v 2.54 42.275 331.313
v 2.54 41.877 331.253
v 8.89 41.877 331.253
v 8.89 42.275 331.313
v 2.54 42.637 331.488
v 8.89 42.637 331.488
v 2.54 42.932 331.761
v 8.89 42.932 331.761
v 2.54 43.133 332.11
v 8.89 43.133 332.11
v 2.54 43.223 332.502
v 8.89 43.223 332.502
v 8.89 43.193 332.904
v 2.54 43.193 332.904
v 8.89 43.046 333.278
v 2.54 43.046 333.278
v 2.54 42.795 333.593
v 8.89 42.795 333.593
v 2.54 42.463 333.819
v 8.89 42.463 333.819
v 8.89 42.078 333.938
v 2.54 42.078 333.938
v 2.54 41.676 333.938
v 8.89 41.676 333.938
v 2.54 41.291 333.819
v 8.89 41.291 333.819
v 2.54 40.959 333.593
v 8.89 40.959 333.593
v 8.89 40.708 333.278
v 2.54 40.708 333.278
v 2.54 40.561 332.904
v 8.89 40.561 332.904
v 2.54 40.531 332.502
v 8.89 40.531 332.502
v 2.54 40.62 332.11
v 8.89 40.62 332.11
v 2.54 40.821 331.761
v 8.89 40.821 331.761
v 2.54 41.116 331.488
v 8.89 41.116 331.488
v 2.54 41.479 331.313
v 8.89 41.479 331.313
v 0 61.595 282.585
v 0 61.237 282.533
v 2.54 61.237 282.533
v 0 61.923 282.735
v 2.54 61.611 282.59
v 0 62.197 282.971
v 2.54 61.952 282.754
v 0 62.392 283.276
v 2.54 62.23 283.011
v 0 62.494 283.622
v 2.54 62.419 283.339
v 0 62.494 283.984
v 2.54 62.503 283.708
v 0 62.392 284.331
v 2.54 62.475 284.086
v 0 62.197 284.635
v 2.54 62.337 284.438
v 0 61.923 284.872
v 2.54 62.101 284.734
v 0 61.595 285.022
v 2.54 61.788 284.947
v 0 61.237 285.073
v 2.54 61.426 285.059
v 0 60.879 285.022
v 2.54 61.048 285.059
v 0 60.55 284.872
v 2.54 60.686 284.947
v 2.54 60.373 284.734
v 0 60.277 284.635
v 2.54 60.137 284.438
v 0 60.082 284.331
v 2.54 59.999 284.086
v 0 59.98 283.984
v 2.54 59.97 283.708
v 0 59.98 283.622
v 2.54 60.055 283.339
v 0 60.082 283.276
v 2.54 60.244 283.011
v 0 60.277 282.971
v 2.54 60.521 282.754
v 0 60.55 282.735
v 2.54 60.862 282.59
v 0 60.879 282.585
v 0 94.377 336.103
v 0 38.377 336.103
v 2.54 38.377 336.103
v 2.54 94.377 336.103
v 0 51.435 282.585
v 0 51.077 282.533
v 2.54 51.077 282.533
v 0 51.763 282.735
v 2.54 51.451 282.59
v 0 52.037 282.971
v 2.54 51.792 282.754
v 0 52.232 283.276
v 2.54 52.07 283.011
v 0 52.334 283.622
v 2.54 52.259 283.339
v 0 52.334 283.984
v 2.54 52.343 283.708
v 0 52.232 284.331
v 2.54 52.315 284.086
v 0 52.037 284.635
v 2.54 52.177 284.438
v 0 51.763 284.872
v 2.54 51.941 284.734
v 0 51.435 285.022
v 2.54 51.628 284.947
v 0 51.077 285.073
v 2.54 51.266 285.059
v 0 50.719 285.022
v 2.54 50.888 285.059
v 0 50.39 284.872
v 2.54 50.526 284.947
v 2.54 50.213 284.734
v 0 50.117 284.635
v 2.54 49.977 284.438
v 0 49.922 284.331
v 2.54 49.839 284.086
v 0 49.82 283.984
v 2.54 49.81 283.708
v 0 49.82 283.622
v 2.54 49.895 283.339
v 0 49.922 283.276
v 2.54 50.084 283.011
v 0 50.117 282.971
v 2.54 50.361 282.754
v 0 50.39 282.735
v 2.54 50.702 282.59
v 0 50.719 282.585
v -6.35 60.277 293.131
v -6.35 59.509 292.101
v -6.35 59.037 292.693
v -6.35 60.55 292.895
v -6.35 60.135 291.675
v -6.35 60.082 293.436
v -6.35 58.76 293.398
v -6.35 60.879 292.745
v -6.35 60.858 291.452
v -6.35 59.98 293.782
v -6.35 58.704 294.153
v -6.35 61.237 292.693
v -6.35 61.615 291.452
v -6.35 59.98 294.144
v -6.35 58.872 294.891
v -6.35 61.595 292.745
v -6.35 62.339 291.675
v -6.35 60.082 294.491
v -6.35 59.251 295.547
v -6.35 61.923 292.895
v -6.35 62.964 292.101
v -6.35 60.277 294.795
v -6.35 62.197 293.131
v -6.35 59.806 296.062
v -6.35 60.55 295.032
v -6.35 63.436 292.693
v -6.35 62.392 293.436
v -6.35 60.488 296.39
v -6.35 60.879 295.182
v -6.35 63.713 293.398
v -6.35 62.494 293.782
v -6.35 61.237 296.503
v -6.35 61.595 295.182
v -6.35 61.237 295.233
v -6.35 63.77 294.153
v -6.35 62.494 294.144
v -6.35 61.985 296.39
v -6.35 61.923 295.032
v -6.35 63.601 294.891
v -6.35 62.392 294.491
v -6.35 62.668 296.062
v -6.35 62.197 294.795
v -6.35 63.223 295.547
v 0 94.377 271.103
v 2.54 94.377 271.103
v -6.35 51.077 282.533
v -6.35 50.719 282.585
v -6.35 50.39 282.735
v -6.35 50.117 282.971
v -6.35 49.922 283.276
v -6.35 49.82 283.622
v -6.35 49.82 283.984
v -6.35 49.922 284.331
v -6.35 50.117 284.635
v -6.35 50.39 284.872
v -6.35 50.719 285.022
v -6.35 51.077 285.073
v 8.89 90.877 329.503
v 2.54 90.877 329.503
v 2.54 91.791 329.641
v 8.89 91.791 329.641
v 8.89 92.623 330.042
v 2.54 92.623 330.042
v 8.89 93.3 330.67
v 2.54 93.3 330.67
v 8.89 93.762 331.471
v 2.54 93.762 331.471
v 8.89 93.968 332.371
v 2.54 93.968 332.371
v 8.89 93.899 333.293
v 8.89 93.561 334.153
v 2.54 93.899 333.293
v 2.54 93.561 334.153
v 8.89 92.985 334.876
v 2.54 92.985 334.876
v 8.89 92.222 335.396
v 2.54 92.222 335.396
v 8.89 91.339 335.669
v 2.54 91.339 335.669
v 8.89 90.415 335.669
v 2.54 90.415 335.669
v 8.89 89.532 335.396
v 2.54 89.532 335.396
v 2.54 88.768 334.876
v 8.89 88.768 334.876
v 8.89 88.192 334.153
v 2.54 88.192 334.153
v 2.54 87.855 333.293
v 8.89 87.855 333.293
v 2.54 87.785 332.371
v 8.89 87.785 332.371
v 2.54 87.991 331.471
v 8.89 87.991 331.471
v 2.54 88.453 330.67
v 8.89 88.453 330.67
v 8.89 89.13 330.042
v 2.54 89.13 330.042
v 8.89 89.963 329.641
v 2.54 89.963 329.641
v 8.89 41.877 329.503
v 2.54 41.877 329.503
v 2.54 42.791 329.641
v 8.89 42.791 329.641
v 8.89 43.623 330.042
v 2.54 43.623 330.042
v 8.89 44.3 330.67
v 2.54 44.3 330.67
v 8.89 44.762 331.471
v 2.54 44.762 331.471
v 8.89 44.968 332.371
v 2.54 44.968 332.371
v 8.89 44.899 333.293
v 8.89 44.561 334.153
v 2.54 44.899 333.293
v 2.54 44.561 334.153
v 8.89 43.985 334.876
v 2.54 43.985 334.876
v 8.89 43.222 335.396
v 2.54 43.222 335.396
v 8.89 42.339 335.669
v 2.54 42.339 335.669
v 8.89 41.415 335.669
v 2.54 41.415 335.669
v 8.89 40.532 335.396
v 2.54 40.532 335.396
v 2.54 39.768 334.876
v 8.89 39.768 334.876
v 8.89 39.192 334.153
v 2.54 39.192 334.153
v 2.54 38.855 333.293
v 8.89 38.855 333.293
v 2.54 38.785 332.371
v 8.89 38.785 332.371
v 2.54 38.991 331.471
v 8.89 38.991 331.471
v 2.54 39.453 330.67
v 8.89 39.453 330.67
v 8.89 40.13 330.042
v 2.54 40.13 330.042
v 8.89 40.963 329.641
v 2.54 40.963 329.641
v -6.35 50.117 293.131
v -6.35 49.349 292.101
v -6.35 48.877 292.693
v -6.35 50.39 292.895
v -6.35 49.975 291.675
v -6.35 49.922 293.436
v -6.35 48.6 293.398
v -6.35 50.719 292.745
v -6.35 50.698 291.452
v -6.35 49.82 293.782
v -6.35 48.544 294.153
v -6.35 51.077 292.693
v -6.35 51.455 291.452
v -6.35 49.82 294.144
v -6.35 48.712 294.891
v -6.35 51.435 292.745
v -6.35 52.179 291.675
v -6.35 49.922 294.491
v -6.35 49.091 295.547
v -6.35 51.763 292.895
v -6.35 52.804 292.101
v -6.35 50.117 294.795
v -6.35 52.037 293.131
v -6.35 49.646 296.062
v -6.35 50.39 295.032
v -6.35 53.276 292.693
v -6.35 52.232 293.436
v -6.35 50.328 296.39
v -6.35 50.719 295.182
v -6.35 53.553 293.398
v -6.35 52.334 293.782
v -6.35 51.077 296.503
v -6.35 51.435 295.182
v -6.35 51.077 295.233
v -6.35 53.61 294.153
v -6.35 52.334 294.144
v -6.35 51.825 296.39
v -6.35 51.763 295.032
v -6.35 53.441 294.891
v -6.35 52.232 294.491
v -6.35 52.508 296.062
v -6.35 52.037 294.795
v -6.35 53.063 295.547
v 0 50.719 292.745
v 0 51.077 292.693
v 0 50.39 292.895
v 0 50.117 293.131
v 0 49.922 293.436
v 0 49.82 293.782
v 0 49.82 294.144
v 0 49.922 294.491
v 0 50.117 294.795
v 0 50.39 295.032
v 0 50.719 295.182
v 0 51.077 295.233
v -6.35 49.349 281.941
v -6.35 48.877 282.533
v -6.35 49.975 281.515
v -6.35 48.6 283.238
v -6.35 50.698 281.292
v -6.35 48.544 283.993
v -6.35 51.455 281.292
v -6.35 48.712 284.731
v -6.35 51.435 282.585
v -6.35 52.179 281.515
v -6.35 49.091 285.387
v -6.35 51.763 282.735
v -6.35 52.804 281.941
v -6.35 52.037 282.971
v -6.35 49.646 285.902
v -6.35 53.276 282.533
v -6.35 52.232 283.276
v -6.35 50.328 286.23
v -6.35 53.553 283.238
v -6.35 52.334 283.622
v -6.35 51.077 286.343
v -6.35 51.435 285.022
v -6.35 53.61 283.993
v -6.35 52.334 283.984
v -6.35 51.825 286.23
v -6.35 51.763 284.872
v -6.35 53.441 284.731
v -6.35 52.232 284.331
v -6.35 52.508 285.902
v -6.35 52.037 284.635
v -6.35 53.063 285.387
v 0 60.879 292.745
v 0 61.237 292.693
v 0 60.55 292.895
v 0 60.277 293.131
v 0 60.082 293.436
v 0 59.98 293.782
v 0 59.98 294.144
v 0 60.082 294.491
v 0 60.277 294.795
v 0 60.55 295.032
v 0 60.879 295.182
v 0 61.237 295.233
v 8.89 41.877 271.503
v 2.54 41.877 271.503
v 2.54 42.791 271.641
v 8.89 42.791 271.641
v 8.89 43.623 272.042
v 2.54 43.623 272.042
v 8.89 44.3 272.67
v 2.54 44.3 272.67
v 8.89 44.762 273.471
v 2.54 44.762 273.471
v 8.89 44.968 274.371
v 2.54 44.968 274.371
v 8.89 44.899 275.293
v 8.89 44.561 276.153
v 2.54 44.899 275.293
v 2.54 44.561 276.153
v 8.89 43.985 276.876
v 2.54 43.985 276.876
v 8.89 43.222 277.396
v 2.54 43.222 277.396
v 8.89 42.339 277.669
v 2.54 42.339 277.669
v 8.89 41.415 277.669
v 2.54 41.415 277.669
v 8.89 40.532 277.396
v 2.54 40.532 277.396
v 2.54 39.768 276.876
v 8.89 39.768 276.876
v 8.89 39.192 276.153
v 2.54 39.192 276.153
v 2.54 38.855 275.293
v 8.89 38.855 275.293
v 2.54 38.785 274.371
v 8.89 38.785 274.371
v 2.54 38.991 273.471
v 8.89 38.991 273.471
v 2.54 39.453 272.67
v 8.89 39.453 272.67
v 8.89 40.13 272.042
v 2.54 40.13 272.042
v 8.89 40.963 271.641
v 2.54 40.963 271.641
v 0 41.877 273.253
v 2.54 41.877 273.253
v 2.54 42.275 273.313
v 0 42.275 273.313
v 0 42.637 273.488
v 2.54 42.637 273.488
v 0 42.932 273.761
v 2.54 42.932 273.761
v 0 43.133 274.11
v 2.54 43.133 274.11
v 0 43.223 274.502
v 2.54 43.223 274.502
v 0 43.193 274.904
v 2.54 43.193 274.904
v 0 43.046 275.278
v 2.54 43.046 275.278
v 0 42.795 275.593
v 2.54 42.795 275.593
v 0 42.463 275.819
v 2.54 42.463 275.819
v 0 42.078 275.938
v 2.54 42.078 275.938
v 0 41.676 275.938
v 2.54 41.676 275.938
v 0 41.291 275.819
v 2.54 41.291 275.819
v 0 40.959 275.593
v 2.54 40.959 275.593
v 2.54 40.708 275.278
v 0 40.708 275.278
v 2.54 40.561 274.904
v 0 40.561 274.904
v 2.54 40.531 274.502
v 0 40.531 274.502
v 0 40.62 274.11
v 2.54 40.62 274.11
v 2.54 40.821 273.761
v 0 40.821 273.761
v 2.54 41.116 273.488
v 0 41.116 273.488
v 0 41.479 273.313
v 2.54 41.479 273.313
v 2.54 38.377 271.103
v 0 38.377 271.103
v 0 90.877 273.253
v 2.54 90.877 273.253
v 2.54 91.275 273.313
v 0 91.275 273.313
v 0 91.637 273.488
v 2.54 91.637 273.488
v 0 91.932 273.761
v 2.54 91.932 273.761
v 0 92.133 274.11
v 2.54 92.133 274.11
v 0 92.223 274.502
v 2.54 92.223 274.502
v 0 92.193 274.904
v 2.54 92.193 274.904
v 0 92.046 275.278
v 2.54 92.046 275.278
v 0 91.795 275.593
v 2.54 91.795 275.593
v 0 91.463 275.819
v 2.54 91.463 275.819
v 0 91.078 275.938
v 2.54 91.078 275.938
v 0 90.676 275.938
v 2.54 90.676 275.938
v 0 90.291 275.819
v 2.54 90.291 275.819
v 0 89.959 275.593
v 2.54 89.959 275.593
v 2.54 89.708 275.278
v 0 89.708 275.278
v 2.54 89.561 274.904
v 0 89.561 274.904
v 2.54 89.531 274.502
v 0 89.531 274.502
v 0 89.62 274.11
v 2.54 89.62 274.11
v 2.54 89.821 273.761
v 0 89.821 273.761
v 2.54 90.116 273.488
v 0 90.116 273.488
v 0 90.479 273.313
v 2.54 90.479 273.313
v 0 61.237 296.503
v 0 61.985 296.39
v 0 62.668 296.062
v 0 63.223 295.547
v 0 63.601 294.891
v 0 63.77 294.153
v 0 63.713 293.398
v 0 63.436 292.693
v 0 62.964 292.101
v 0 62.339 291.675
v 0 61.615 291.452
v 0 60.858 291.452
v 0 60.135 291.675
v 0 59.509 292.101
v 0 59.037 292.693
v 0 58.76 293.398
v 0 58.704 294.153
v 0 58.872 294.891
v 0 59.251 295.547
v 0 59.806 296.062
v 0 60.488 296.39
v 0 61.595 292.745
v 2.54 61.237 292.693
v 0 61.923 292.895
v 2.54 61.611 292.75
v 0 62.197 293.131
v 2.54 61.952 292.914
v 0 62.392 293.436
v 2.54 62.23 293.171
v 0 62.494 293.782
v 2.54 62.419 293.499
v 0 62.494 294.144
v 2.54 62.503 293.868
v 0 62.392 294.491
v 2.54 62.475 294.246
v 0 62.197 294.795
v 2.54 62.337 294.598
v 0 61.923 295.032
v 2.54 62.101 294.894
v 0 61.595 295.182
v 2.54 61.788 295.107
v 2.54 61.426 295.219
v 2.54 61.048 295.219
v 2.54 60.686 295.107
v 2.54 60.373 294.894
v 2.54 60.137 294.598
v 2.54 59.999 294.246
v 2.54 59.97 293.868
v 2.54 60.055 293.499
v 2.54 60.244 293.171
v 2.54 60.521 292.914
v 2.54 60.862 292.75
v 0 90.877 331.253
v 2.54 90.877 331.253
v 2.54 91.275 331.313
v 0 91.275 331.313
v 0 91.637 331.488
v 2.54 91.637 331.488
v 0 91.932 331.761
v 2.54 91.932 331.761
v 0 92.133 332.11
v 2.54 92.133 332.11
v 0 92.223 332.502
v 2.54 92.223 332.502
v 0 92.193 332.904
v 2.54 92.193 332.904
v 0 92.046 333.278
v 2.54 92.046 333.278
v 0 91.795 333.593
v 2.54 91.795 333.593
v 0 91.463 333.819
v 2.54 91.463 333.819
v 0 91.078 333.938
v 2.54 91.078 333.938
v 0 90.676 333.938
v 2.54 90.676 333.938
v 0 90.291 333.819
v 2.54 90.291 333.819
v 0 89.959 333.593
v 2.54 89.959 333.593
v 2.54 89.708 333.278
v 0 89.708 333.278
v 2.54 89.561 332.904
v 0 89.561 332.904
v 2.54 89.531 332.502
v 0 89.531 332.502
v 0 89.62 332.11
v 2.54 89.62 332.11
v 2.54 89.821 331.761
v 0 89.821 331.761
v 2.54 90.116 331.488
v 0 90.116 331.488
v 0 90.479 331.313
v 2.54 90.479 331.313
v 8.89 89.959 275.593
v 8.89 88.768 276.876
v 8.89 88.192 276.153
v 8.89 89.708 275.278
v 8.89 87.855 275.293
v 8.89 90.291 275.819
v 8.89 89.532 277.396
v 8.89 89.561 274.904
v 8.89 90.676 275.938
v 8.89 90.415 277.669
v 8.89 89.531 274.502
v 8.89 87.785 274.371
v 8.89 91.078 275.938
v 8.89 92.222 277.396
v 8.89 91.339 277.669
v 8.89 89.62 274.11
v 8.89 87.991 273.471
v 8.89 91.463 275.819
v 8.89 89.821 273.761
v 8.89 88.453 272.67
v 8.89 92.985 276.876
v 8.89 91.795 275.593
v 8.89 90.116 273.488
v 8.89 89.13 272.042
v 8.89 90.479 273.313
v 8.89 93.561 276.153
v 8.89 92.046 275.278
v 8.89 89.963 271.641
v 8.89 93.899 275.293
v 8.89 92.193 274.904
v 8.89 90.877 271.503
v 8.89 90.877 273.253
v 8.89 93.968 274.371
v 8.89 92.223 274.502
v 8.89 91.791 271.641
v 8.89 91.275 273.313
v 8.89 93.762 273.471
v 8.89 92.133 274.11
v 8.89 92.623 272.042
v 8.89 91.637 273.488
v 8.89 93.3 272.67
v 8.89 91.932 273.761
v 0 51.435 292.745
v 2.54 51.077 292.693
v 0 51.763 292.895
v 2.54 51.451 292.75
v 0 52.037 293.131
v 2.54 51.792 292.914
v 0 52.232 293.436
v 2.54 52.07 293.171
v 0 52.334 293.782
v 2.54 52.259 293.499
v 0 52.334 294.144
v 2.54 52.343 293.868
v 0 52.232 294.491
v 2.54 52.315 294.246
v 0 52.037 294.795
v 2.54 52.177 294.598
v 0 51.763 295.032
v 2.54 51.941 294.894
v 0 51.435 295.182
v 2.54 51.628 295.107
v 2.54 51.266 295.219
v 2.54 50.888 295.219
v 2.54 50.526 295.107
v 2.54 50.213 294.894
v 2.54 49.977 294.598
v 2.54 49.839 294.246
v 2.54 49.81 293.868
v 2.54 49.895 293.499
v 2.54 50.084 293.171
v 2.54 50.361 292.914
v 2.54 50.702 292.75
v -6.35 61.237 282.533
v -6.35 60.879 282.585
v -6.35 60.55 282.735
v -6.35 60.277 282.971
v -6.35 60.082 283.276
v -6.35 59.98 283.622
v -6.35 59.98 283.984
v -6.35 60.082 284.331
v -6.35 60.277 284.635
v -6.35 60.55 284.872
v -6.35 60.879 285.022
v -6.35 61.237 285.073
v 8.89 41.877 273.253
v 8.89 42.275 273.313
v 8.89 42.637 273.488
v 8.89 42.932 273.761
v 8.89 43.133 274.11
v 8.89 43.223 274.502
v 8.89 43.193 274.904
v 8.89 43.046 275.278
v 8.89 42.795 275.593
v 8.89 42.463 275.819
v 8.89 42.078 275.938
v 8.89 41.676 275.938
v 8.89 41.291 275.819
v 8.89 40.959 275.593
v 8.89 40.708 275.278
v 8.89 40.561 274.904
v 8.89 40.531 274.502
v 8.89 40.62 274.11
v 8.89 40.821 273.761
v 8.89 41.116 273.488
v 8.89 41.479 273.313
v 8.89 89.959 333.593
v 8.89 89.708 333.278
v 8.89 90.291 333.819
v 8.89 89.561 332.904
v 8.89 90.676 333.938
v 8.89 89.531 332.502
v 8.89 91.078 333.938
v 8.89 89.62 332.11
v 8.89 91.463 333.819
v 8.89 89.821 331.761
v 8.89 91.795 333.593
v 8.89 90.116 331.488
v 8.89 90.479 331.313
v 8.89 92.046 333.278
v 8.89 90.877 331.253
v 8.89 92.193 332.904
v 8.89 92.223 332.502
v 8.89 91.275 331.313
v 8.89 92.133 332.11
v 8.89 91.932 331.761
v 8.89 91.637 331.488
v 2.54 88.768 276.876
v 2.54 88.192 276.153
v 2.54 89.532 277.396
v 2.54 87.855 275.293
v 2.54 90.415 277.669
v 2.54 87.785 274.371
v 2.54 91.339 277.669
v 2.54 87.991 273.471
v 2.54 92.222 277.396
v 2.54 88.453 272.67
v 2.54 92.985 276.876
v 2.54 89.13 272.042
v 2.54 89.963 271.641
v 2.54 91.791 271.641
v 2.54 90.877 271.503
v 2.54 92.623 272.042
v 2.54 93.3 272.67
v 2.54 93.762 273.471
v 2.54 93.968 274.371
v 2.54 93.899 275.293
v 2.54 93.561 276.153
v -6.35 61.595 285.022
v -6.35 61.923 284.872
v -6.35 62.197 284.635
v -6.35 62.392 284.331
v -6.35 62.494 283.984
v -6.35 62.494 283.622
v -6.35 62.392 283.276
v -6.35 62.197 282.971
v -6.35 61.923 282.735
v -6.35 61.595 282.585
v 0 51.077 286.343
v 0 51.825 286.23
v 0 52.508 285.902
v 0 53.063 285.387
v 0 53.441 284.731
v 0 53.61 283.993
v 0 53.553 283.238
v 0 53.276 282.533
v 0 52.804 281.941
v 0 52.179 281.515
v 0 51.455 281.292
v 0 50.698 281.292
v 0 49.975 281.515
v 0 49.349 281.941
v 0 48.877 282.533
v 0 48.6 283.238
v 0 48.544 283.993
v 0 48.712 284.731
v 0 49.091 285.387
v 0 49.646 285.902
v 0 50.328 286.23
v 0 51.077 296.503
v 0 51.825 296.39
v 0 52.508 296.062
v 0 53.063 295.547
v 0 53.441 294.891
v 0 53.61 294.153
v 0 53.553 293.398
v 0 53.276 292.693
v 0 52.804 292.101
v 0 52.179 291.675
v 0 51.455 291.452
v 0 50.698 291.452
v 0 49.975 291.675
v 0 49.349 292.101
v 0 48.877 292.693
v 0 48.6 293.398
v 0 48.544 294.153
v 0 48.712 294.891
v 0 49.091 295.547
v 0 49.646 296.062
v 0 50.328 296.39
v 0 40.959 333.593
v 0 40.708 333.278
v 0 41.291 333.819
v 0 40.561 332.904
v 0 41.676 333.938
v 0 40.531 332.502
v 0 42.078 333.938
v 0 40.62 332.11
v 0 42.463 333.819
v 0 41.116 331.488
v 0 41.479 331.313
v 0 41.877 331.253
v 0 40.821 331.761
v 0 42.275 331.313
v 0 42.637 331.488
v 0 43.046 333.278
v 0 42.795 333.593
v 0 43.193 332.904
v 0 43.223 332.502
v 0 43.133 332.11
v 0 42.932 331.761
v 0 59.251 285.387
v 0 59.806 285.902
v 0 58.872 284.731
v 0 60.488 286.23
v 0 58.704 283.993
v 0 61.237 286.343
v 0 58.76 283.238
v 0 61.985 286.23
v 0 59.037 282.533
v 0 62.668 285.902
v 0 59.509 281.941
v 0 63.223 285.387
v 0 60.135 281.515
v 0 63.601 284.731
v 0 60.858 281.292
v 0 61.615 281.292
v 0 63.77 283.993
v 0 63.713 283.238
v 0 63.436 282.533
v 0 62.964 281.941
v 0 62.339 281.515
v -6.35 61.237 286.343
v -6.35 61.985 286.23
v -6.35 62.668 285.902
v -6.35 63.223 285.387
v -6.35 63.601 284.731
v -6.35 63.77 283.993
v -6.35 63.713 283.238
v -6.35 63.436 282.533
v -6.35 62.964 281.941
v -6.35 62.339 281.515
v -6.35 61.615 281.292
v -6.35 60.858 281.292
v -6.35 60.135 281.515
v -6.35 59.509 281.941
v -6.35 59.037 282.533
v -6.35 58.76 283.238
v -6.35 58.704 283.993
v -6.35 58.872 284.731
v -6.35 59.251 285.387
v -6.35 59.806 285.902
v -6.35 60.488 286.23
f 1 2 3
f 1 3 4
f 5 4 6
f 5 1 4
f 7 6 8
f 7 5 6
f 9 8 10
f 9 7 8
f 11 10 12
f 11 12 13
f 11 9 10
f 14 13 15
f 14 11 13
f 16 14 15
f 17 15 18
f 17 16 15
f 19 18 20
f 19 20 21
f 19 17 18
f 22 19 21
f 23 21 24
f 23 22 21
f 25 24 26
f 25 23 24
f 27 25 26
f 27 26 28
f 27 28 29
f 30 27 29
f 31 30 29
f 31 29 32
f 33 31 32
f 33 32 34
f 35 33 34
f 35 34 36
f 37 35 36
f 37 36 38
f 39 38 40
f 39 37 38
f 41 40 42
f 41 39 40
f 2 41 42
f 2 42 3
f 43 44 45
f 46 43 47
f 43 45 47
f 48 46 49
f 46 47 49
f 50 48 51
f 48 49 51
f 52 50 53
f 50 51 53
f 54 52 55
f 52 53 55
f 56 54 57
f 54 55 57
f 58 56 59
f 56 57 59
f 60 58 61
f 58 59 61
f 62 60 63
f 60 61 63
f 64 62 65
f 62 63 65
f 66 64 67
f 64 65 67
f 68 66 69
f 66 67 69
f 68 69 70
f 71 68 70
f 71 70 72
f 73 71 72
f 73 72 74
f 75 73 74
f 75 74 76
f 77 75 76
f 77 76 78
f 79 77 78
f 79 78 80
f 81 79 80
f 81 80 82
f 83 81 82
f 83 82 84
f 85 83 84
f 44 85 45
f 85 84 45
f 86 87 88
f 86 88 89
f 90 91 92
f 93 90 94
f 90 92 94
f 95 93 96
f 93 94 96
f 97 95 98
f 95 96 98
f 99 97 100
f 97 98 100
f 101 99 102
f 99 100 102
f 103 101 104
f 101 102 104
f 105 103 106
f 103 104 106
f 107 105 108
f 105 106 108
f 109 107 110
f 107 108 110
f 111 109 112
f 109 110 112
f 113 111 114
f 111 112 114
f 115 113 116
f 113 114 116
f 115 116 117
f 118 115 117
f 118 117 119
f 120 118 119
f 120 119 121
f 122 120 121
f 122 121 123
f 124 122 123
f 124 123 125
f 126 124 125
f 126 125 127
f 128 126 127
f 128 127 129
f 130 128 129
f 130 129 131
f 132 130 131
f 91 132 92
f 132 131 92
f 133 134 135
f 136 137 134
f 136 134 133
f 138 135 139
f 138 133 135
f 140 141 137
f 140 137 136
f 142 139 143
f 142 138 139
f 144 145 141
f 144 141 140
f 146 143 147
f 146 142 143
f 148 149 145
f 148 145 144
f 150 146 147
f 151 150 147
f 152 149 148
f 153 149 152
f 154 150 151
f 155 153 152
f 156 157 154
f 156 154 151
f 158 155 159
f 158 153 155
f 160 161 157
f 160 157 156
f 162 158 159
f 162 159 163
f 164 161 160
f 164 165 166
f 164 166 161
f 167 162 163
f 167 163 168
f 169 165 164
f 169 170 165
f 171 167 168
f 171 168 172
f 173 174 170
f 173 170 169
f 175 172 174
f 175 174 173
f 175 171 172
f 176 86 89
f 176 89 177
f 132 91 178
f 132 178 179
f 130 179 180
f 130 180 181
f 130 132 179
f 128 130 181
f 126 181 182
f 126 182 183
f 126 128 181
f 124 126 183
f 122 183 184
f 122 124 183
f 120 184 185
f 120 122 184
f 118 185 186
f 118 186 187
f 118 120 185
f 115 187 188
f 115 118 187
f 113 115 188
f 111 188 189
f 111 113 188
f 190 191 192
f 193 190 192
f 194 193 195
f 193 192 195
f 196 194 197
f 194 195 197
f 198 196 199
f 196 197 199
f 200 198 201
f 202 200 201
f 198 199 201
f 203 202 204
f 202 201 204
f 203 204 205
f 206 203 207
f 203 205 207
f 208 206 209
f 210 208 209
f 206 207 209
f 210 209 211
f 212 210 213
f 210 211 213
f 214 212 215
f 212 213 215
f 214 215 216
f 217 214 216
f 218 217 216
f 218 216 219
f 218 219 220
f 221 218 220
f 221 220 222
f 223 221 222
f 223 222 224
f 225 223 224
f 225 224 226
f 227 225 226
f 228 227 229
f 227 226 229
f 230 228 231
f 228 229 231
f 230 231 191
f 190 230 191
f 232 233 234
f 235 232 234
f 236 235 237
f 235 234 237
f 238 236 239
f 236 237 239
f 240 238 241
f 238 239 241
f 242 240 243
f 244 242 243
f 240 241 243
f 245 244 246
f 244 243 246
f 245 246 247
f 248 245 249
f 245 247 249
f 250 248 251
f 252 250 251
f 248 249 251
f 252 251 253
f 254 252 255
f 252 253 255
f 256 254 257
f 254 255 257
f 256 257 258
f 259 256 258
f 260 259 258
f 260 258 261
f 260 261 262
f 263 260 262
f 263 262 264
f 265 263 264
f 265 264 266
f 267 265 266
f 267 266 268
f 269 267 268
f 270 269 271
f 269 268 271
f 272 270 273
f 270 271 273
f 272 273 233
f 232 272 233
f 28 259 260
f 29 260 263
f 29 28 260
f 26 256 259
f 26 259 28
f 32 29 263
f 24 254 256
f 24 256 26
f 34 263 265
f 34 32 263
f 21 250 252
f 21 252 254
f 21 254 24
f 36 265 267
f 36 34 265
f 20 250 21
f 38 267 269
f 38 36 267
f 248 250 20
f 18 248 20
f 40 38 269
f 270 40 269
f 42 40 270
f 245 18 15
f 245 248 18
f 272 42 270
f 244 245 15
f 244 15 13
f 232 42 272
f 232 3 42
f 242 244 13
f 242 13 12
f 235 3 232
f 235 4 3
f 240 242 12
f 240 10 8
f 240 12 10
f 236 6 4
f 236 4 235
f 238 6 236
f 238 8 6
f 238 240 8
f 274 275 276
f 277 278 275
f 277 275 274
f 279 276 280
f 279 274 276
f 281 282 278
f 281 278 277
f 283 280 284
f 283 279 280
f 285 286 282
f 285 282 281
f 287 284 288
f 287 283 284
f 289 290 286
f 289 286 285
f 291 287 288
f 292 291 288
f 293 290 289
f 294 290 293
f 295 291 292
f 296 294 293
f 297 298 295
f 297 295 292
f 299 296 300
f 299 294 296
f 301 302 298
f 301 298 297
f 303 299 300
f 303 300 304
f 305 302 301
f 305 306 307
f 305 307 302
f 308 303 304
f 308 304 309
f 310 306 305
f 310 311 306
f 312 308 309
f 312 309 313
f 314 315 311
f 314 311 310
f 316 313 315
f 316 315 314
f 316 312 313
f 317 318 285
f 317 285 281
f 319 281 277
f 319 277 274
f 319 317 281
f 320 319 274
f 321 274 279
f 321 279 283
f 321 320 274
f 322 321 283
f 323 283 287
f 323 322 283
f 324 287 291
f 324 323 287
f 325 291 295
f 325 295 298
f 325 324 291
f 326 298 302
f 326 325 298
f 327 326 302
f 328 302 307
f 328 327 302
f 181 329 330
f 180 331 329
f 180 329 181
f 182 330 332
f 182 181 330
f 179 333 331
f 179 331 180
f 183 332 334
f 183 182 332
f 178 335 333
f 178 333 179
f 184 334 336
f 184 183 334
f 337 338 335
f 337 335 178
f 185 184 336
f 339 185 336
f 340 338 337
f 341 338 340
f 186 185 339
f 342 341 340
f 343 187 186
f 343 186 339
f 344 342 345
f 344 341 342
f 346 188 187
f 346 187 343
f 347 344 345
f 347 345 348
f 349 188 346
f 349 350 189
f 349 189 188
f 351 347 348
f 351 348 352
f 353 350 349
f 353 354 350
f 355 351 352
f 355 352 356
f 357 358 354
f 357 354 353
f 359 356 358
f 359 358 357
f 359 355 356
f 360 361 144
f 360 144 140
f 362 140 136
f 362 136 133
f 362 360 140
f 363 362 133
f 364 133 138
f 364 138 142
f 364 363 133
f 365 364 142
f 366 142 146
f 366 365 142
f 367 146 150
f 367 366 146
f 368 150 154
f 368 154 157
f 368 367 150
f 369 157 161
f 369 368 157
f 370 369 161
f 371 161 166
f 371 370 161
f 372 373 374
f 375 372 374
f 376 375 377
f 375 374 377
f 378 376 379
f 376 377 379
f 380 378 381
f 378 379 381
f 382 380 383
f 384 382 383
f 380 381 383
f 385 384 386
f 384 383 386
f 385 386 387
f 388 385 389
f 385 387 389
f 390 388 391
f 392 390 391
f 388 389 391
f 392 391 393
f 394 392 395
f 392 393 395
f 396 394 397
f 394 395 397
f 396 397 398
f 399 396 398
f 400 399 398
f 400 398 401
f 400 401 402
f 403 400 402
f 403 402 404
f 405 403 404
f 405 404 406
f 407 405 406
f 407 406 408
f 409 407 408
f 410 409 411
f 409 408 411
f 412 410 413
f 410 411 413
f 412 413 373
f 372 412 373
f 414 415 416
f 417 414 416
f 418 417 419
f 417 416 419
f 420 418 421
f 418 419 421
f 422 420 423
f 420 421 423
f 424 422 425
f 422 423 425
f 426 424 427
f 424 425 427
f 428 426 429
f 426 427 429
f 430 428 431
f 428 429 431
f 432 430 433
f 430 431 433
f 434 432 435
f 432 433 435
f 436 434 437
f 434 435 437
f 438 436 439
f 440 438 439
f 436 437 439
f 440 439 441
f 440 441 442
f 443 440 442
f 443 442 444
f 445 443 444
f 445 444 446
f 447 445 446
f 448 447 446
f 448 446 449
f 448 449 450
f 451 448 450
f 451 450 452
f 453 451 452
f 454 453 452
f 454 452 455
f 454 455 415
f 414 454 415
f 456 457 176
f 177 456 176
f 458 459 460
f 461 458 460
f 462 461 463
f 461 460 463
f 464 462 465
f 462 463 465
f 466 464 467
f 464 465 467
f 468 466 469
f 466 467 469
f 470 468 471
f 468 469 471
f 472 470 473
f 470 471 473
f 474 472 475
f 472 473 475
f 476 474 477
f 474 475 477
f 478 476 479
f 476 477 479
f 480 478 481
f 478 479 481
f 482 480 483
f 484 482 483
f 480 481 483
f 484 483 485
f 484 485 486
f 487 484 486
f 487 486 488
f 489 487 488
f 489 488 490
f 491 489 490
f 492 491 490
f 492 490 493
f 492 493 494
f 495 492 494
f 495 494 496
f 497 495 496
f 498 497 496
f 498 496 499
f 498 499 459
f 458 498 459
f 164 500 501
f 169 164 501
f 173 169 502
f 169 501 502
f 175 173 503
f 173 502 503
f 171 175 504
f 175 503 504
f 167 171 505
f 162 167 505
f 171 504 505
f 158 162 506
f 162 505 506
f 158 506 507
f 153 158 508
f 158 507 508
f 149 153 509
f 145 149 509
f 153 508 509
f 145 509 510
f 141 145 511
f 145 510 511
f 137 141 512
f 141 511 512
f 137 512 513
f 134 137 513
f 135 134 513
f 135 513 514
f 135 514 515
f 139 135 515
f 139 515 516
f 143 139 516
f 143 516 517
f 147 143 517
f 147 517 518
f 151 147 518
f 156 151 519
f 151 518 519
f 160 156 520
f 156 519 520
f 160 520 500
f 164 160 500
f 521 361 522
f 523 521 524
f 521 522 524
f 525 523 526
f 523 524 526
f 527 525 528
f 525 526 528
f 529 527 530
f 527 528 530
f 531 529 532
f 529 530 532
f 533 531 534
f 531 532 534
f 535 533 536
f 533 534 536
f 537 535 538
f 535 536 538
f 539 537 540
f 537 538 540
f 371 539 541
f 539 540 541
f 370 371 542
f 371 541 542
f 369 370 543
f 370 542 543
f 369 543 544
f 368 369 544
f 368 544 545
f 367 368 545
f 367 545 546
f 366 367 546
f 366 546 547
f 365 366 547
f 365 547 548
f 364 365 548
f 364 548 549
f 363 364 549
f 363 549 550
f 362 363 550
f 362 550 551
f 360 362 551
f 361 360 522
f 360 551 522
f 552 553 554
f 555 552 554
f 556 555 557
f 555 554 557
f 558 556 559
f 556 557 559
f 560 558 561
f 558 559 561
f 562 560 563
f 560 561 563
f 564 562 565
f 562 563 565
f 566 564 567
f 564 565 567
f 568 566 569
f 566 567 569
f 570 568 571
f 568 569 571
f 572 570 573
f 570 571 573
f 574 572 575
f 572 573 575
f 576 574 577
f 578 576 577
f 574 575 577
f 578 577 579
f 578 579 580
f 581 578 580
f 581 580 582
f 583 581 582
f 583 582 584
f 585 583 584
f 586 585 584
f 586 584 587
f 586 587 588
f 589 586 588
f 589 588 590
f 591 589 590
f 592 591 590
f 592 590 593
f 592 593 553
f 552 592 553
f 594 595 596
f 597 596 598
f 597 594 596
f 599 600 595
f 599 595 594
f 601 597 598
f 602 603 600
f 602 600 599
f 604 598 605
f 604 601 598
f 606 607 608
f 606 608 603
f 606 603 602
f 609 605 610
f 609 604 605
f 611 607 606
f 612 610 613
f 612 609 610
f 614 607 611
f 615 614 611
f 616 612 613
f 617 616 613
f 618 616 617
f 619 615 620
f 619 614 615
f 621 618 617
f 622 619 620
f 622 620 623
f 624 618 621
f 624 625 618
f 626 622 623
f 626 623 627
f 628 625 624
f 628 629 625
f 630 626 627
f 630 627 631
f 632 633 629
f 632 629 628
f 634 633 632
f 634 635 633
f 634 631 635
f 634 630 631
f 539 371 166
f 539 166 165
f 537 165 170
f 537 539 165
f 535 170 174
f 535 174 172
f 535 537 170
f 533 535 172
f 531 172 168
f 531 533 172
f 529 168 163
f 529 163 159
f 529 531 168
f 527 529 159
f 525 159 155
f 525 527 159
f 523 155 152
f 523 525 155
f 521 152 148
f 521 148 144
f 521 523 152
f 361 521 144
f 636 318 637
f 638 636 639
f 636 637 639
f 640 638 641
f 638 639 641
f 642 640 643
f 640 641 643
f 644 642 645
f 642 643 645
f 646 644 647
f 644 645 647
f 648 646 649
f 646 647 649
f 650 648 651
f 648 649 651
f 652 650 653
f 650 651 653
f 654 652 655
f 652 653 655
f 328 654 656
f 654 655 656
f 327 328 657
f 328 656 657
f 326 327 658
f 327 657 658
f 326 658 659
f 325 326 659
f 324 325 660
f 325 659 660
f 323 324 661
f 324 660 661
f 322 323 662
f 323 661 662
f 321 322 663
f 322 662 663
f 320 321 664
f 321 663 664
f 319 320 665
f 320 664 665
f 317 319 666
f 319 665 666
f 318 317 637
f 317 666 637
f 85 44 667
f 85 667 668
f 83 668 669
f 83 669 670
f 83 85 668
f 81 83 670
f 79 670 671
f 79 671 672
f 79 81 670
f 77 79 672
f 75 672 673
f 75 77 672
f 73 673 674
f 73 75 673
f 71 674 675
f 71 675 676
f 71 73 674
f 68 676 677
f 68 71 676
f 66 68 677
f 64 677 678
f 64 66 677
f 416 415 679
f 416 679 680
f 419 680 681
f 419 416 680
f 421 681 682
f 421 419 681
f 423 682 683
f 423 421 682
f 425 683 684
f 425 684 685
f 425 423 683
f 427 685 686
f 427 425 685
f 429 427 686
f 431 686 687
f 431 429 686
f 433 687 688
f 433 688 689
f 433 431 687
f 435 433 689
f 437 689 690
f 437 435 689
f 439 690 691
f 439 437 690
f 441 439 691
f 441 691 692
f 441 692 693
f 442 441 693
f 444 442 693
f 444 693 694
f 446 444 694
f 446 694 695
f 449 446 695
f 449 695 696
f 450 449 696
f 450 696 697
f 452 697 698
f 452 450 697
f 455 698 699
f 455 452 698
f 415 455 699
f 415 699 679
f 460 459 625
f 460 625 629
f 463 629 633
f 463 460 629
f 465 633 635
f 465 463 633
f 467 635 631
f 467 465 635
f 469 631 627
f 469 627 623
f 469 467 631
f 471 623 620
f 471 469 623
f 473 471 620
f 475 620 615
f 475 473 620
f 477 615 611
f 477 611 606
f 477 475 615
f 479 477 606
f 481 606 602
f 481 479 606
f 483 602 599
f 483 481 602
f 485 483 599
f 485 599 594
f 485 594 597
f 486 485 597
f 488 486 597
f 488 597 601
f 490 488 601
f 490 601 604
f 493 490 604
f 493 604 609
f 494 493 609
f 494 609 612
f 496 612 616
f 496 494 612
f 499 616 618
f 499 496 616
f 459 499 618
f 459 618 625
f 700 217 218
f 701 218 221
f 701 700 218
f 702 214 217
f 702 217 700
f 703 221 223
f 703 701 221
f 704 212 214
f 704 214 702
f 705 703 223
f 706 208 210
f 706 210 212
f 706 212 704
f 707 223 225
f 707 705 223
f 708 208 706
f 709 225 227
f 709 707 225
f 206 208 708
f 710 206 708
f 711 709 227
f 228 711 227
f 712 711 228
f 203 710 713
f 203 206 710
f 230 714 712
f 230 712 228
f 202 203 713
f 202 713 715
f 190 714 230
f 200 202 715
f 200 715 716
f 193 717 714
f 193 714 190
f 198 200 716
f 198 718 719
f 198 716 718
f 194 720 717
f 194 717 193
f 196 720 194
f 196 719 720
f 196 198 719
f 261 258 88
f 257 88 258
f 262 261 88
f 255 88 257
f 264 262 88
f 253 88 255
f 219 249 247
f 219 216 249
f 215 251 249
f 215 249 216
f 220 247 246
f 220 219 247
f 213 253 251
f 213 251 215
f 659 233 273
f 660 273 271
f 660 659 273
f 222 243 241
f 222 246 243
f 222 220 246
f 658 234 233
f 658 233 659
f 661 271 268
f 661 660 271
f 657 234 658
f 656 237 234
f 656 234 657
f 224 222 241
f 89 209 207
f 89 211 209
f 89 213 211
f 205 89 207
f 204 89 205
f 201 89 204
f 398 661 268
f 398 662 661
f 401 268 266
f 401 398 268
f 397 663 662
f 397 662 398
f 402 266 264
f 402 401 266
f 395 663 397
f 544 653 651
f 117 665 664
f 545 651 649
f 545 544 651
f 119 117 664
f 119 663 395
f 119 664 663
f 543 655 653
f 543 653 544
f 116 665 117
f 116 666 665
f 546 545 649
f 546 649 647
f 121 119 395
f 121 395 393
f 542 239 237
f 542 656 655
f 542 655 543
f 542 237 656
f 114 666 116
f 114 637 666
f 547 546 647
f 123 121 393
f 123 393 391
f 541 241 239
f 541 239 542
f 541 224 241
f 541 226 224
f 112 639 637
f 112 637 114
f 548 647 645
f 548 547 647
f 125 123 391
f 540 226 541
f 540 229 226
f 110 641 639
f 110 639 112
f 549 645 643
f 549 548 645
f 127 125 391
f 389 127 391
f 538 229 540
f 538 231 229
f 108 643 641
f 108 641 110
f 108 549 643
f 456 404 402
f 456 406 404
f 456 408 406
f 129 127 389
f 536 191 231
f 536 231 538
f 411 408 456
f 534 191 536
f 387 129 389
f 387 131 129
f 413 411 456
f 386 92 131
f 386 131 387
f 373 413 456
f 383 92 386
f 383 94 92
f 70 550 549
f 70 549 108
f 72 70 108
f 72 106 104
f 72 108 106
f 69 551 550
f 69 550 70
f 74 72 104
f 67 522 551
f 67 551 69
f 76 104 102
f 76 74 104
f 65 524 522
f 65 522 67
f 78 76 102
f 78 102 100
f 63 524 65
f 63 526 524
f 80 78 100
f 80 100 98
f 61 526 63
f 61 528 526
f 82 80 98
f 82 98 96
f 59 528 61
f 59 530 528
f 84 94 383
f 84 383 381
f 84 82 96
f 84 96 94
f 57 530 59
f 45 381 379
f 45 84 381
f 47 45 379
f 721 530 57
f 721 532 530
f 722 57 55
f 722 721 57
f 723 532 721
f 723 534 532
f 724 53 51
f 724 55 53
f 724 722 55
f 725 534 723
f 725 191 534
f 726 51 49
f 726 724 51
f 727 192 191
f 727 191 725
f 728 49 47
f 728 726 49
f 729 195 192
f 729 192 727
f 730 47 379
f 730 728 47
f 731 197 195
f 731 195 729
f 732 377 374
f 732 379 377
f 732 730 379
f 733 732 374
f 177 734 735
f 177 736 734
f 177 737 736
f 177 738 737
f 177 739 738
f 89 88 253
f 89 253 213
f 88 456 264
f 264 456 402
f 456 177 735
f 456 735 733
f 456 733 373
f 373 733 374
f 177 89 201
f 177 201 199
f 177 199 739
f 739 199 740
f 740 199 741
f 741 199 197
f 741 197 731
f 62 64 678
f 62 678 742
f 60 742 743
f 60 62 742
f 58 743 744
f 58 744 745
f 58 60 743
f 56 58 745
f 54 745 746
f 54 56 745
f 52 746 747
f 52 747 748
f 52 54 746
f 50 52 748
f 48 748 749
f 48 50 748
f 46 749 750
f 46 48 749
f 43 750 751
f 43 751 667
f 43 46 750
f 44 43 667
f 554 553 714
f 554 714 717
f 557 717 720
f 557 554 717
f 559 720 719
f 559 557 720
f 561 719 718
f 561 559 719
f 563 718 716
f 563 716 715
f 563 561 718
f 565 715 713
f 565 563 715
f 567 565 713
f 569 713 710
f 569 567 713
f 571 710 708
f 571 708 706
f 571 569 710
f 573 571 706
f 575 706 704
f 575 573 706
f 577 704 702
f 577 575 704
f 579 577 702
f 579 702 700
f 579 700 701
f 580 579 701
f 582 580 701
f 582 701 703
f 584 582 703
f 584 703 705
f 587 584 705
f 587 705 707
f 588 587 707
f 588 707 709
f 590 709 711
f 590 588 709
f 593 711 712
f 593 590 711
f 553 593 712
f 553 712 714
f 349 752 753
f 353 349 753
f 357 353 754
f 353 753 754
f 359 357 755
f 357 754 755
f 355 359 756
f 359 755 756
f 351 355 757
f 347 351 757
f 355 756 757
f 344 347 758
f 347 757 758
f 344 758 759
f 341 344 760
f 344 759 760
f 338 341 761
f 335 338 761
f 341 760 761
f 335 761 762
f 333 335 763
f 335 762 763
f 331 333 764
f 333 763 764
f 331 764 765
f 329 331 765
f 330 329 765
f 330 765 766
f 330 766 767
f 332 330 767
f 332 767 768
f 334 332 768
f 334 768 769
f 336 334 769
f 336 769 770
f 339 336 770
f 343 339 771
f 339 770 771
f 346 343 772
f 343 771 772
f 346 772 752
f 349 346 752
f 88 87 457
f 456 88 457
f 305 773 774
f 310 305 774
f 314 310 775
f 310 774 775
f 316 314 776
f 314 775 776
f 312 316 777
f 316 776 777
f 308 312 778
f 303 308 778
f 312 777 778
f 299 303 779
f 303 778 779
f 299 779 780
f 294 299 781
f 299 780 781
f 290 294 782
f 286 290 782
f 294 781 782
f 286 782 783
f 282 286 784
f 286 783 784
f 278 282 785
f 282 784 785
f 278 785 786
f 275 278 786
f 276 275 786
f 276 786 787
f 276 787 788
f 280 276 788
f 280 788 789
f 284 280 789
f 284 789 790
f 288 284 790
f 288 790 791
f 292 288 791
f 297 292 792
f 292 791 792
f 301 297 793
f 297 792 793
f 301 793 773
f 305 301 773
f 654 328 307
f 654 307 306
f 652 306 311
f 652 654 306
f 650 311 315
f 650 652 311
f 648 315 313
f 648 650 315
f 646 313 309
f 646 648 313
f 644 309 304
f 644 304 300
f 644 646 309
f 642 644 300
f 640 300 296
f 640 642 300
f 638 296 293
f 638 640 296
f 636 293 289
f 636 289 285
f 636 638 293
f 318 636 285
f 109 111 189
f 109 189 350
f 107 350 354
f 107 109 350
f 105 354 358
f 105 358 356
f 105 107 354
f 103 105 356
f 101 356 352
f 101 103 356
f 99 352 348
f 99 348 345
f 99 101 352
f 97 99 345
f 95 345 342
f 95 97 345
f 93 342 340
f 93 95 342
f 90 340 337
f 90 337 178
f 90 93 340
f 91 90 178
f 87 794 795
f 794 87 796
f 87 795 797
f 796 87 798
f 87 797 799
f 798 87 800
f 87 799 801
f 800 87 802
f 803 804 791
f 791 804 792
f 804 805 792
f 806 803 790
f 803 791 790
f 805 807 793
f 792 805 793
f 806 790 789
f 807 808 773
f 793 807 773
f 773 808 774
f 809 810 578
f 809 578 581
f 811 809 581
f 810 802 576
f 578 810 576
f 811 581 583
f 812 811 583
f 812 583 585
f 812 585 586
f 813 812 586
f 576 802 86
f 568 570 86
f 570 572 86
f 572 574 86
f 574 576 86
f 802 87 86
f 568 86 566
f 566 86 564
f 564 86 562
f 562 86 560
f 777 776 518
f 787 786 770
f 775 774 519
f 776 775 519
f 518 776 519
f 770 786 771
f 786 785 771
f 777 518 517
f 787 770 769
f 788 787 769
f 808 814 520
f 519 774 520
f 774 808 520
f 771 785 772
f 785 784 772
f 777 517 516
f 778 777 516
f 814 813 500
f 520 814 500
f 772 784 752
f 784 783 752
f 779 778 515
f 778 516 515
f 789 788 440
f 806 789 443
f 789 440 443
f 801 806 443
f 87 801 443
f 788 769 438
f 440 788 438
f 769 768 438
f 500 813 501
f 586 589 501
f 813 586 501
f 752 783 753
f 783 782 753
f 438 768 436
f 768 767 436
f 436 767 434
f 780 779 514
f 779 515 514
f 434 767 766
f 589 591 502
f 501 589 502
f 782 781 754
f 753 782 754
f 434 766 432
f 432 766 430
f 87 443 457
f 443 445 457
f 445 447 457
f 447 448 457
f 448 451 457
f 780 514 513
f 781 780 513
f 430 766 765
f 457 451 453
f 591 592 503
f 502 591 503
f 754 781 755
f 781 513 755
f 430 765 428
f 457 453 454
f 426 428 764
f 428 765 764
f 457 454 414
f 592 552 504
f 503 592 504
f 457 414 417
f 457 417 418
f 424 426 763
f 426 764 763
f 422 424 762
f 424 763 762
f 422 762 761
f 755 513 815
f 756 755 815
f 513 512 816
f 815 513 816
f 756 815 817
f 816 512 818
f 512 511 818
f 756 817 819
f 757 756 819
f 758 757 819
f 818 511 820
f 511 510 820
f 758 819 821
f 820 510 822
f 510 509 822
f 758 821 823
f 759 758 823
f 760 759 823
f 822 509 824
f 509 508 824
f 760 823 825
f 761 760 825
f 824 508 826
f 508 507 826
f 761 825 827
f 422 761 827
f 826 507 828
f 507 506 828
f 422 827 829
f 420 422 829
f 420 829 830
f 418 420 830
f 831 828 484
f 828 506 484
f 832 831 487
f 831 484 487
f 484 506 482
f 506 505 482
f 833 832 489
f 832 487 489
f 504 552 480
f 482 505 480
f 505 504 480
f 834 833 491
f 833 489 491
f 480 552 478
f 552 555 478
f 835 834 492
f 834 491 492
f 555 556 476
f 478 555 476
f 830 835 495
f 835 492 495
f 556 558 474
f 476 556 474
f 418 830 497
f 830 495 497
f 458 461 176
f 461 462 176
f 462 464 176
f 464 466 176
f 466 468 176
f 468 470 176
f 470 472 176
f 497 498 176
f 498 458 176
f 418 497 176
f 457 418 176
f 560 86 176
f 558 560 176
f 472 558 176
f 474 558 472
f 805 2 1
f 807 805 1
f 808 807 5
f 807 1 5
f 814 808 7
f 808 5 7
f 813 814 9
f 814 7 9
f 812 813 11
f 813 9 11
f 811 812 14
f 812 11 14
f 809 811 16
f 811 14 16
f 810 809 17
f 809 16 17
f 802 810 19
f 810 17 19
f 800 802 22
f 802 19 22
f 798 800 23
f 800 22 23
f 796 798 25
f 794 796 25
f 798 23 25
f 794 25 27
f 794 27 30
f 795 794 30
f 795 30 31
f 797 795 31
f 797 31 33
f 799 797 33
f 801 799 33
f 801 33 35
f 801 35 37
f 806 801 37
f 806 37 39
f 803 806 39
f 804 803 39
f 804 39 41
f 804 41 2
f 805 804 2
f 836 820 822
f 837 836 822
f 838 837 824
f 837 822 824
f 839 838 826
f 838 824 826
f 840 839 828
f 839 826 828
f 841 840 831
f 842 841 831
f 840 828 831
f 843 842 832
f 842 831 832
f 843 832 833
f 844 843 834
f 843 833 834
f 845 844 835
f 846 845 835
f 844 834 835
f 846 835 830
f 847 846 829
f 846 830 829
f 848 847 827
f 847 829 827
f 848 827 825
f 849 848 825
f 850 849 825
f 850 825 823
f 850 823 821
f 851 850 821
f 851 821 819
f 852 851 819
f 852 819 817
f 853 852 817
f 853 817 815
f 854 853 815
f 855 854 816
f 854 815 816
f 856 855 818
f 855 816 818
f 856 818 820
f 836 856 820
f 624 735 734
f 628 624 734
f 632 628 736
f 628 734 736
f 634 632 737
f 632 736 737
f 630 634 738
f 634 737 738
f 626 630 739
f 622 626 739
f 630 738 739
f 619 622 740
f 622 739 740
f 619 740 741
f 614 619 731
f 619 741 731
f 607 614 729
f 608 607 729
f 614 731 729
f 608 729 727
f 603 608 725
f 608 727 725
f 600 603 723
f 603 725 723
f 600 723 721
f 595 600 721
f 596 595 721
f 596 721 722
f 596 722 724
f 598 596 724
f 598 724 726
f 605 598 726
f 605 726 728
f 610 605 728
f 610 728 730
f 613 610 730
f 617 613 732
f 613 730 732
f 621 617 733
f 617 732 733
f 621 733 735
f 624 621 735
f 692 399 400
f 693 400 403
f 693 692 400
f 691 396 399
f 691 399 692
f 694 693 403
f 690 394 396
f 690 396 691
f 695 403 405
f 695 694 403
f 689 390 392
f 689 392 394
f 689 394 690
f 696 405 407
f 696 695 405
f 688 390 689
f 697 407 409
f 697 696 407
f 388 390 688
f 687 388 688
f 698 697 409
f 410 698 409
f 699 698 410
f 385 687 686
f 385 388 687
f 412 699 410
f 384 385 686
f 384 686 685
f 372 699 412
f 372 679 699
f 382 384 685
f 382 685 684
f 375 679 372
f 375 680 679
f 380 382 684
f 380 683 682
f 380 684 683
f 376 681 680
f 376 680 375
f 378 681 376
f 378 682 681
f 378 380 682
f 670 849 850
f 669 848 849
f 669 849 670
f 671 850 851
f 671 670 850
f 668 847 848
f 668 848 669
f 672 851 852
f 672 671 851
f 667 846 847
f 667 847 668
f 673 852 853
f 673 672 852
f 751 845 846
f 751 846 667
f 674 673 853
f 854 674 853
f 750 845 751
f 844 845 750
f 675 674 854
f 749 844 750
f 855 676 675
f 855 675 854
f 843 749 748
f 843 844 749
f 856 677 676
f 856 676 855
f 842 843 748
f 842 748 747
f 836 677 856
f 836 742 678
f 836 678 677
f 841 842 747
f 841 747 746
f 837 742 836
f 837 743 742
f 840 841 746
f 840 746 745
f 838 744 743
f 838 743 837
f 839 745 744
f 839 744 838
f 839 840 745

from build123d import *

# Parameters (mm, degrees)
SKETCH1_W           = 65
SKETCH1_H           = 56
BOSS_EXTRUDE1_DEPTH = 2.54
SKETCH2_R           = 3.1
SKETCH2_R_2         = 1.349999967
SKETCH2_R_3         = 1.35
BOSS_EXTRUDE2_DEPTH = 6.35
SKETCH3_R           = 2.54
SKETCH3_R_2         = 1.27
BOSS_EXTRUDE3_DEPTH = 6.35
SKETCH4_R           = 1.349999967
SKETCH4_R_2         = 1.35
SKETCH4_R_3         = 1.27
CUT_EXTRUDE1_DEPTH  = 12.7


with BuildPart() as part:
    # Sketch1 → Boss-Extrude1 (new body)
    with BuildSketch(Plane(origin=(0, 0, 0), x_dir=(0, 0, -1), z_dir=(1, 0, 0))):
        with Locations((-303.603151862, 66.376790831)):
            Rectangle(SKETCH1_W, SKETCH1_H)
    extrude(amount=BOSS_EXTRUDE1_DEPTH)

    # Sketch2 → Boss-Extrude2 (add)
    with BuildSketch(Plane(origin=(2.54, 0, 0), x_dir=(0, 0, -1), z_dir=(1, 0, 0))):
        with Locations((-332.603151862, 90.876790831)):
            Circle(SKETCH2_R)
        with Locations((-332.603151862, 90.876790831)):
            Circle(SKETCH2_R_2, mode=Mode.SUBTRACT)
        with Locations((-274.603151862, 90.876790831)):
            Circle(SKETCH2_R)
        with Locations((-274.603151862, 90.876790831)):
            Circle(SKETCH2_R_3, mode=Mode.SUBTRACT)
        with Locations((-274.603151862, 41.876790831)):
            Circle(SKETCH2_R)
        with Locations((-274.603151862, 41.876790831)):
            Circle(SKETCH2_R_3, mode=Mode.SUBTRACT)
        with Locations((-332.603151862, 41.876790831)):
            Circle(SKETCH2_R)
        with Locations((-332.603151862, 41.876790831)):
            Circle(SKETCH2_R_3, mode=Mode.SUBTRACT)
    extrude(amount=BOSS_EXTRUDE2_DEPTH)

    # Sketch3 → Boss-Extrude3 (add)
    with BuildSketch(Plane.ZY):
        with Locations((283.803151862, 61.236790831)):
            Circle(SKETCH3_R)
        with Locations((283.803151862, 61.236790831)):
            Circle(SKETCH3_R_2, mode=Mode.SUBTRACT)
        with Locations((293.963151862, 61.236790831)):
            Circle(SKETCH3_R)
        with Locations((293.963151862, 61.236790831)):
            Circle(SKETCH3_R_2, mode=Mode.SUBTRACT)
        with Locations((283.803151862, 51.076790831)):
            Circle(SKETCH3_R)
        with Locations((283.803151862, 51.076790831)):
            Circle(SKETCH3_R_2, mode=Mode.SUBTRACT)
        with Locations((293.963151862, 51.076790831)):
            Circle(SKETCH3_R)
        with Locations((293.963151862, 51.076790831)):
            Circle(SKETCH3_R_2, mode=Mode.SUBTRACT)
    extrude(amount=BOSS_EXTRUDE3_DEPTH)

    # Sketch4 → Cut-Extrude1 (cut, symmetric)
    with BuildSketch(Plane(origin=(2.54, 0, 0), x_dir=(0, 0, -1), z_dir=(1, 0, 0))):
        with Locations((-332.603151862, 90.876790831)):
            Circle(SKETCH4_R)
        with Locations((-274.603151862, 90.876790831)):
            Circle(SKETCH4_R_2)
        with Locations((-274.603151862, 41.876790831)):
            Circle(SKETCH4_R_2)
        with Locations((-332.603151862, 41.876790831)):
            Circle(SKETCH4_R_2)
        with Locations((-283.803151862, 61.236790831)):
            Circle(SKETCH4_R_3)
        with Locations((-293.963151862, 61.236790831)):
            Circle(SKETCH4_R_3)
        with Locations((-283.803151862, 51.076790831)):
            Circle(SKETCH4_R_3)
        with Locations((-293.963151862, 51.076790831)):
            Circle(SKETCH4_R_3)
    extrude(amount=CUT_EXTRUDE1_DEPTH, both=True, mode=Mode.SUBTRACT)


solid = part.part
